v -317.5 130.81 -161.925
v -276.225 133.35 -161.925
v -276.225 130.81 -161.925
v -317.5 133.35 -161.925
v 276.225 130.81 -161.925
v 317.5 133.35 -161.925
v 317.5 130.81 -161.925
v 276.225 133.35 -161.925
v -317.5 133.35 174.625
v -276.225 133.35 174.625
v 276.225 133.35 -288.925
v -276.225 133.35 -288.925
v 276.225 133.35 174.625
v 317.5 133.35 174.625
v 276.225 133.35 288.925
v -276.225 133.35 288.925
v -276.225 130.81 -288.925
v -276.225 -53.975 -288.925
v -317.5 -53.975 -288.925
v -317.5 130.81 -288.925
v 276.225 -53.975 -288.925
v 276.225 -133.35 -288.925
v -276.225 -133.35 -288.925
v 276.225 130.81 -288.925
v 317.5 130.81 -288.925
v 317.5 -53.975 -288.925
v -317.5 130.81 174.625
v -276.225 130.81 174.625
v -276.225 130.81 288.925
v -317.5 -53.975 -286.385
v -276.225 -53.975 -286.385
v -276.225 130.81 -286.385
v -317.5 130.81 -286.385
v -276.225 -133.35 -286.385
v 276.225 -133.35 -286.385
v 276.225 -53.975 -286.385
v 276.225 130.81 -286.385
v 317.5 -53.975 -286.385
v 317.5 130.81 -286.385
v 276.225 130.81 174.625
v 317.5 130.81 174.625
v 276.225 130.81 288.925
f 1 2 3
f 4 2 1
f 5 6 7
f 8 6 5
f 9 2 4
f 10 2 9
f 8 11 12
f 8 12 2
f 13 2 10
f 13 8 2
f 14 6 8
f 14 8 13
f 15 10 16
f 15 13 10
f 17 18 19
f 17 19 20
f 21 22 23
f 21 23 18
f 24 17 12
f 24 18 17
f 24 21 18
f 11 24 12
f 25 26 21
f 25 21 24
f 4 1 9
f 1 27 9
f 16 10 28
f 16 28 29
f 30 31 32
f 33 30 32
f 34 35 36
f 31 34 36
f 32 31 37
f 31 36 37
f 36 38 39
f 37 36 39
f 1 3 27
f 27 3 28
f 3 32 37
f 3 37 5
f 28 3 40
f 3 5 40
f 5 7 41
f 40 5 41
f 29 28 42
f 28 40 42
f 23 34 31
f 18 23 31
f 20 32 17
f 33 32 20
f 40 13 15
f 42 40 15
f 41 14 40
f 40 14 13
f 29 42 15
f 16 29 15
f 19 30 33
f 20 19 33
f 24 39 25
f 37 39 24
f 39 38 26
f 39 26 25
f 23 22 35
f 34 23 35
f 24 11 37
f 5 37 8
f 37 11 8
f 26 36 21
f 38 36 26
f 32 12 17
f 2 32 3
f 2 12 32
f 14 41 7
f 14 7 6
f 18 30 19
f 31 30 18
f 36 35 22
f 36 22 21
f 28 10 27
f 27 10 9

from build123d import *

# Parameters (mm, degrees)
F0_W     = 266.7
F0_H     = 577.85
F1_DEPTH = 317.5
F2_T     = -2.54
F3_W     = 41.275
F3_H     = 114.3
F3_H_2   = 127
F4_DEPTH = 2.54
F5_W     = 41.275
F5_H     = 79.375
F6_DEPTH = 2.541


with BuildPart() as f1:
    # F0 (on Right) → F1 (new body, symmetric)
    with BuildSketch(Plane.YZ):
        Rectangle(F0_W, F0_H)
    extrude(amount=F1_DEPTH, both=True)

    # F2
    f2_openings = [f1.faces().sort_by_distance(p)[0] for p in [
        (0, -133.35, 0),
        (0, 0, 288.925),
        (317.5, 0, 0),
        (-317.5, 0, 0),
    ]]
    offset(amount=F2_T, openings=f2_openings)

    # F3 (on face) → F4 (cut, through all)
    with BuildSketch(Plane(origin=(0, 133.35, 0), x_dir=(-1, 0, 0), z_dir=(0, 1, 0))):
        with Locations((-296.8625, 231.775)):
            Rectangle(F3_W, F3_H)
        with Locations((296.8625, 231.775)):
            Rectangle(F3_W, F3_H)
        with Locations((-296.8625, -225.425)):
            Rectangle(F3_W, F3_H_2)
        with Locations((296.8625, -225.425)):
            Rectangle(F3_W, F3_H_2)
    extrude(amount=-F4_DEPTH, mode=Mode.SUBTRACT)

    # F5 (on face) → F6 (cut, through all)
    with BuildSketch(Plane.XY.offset(-286.385)):
        with Locations((-296.8625, -93.6625)):
            Rectangle(F5_W, F5_H)
        with Locations((296.8625, -93.6625)):
            Rectangle(F5_W, F5_H)
    extrude(amount=-F6_DEPTH, mode=Mode.SUBTRACT)


solid = f1.part
